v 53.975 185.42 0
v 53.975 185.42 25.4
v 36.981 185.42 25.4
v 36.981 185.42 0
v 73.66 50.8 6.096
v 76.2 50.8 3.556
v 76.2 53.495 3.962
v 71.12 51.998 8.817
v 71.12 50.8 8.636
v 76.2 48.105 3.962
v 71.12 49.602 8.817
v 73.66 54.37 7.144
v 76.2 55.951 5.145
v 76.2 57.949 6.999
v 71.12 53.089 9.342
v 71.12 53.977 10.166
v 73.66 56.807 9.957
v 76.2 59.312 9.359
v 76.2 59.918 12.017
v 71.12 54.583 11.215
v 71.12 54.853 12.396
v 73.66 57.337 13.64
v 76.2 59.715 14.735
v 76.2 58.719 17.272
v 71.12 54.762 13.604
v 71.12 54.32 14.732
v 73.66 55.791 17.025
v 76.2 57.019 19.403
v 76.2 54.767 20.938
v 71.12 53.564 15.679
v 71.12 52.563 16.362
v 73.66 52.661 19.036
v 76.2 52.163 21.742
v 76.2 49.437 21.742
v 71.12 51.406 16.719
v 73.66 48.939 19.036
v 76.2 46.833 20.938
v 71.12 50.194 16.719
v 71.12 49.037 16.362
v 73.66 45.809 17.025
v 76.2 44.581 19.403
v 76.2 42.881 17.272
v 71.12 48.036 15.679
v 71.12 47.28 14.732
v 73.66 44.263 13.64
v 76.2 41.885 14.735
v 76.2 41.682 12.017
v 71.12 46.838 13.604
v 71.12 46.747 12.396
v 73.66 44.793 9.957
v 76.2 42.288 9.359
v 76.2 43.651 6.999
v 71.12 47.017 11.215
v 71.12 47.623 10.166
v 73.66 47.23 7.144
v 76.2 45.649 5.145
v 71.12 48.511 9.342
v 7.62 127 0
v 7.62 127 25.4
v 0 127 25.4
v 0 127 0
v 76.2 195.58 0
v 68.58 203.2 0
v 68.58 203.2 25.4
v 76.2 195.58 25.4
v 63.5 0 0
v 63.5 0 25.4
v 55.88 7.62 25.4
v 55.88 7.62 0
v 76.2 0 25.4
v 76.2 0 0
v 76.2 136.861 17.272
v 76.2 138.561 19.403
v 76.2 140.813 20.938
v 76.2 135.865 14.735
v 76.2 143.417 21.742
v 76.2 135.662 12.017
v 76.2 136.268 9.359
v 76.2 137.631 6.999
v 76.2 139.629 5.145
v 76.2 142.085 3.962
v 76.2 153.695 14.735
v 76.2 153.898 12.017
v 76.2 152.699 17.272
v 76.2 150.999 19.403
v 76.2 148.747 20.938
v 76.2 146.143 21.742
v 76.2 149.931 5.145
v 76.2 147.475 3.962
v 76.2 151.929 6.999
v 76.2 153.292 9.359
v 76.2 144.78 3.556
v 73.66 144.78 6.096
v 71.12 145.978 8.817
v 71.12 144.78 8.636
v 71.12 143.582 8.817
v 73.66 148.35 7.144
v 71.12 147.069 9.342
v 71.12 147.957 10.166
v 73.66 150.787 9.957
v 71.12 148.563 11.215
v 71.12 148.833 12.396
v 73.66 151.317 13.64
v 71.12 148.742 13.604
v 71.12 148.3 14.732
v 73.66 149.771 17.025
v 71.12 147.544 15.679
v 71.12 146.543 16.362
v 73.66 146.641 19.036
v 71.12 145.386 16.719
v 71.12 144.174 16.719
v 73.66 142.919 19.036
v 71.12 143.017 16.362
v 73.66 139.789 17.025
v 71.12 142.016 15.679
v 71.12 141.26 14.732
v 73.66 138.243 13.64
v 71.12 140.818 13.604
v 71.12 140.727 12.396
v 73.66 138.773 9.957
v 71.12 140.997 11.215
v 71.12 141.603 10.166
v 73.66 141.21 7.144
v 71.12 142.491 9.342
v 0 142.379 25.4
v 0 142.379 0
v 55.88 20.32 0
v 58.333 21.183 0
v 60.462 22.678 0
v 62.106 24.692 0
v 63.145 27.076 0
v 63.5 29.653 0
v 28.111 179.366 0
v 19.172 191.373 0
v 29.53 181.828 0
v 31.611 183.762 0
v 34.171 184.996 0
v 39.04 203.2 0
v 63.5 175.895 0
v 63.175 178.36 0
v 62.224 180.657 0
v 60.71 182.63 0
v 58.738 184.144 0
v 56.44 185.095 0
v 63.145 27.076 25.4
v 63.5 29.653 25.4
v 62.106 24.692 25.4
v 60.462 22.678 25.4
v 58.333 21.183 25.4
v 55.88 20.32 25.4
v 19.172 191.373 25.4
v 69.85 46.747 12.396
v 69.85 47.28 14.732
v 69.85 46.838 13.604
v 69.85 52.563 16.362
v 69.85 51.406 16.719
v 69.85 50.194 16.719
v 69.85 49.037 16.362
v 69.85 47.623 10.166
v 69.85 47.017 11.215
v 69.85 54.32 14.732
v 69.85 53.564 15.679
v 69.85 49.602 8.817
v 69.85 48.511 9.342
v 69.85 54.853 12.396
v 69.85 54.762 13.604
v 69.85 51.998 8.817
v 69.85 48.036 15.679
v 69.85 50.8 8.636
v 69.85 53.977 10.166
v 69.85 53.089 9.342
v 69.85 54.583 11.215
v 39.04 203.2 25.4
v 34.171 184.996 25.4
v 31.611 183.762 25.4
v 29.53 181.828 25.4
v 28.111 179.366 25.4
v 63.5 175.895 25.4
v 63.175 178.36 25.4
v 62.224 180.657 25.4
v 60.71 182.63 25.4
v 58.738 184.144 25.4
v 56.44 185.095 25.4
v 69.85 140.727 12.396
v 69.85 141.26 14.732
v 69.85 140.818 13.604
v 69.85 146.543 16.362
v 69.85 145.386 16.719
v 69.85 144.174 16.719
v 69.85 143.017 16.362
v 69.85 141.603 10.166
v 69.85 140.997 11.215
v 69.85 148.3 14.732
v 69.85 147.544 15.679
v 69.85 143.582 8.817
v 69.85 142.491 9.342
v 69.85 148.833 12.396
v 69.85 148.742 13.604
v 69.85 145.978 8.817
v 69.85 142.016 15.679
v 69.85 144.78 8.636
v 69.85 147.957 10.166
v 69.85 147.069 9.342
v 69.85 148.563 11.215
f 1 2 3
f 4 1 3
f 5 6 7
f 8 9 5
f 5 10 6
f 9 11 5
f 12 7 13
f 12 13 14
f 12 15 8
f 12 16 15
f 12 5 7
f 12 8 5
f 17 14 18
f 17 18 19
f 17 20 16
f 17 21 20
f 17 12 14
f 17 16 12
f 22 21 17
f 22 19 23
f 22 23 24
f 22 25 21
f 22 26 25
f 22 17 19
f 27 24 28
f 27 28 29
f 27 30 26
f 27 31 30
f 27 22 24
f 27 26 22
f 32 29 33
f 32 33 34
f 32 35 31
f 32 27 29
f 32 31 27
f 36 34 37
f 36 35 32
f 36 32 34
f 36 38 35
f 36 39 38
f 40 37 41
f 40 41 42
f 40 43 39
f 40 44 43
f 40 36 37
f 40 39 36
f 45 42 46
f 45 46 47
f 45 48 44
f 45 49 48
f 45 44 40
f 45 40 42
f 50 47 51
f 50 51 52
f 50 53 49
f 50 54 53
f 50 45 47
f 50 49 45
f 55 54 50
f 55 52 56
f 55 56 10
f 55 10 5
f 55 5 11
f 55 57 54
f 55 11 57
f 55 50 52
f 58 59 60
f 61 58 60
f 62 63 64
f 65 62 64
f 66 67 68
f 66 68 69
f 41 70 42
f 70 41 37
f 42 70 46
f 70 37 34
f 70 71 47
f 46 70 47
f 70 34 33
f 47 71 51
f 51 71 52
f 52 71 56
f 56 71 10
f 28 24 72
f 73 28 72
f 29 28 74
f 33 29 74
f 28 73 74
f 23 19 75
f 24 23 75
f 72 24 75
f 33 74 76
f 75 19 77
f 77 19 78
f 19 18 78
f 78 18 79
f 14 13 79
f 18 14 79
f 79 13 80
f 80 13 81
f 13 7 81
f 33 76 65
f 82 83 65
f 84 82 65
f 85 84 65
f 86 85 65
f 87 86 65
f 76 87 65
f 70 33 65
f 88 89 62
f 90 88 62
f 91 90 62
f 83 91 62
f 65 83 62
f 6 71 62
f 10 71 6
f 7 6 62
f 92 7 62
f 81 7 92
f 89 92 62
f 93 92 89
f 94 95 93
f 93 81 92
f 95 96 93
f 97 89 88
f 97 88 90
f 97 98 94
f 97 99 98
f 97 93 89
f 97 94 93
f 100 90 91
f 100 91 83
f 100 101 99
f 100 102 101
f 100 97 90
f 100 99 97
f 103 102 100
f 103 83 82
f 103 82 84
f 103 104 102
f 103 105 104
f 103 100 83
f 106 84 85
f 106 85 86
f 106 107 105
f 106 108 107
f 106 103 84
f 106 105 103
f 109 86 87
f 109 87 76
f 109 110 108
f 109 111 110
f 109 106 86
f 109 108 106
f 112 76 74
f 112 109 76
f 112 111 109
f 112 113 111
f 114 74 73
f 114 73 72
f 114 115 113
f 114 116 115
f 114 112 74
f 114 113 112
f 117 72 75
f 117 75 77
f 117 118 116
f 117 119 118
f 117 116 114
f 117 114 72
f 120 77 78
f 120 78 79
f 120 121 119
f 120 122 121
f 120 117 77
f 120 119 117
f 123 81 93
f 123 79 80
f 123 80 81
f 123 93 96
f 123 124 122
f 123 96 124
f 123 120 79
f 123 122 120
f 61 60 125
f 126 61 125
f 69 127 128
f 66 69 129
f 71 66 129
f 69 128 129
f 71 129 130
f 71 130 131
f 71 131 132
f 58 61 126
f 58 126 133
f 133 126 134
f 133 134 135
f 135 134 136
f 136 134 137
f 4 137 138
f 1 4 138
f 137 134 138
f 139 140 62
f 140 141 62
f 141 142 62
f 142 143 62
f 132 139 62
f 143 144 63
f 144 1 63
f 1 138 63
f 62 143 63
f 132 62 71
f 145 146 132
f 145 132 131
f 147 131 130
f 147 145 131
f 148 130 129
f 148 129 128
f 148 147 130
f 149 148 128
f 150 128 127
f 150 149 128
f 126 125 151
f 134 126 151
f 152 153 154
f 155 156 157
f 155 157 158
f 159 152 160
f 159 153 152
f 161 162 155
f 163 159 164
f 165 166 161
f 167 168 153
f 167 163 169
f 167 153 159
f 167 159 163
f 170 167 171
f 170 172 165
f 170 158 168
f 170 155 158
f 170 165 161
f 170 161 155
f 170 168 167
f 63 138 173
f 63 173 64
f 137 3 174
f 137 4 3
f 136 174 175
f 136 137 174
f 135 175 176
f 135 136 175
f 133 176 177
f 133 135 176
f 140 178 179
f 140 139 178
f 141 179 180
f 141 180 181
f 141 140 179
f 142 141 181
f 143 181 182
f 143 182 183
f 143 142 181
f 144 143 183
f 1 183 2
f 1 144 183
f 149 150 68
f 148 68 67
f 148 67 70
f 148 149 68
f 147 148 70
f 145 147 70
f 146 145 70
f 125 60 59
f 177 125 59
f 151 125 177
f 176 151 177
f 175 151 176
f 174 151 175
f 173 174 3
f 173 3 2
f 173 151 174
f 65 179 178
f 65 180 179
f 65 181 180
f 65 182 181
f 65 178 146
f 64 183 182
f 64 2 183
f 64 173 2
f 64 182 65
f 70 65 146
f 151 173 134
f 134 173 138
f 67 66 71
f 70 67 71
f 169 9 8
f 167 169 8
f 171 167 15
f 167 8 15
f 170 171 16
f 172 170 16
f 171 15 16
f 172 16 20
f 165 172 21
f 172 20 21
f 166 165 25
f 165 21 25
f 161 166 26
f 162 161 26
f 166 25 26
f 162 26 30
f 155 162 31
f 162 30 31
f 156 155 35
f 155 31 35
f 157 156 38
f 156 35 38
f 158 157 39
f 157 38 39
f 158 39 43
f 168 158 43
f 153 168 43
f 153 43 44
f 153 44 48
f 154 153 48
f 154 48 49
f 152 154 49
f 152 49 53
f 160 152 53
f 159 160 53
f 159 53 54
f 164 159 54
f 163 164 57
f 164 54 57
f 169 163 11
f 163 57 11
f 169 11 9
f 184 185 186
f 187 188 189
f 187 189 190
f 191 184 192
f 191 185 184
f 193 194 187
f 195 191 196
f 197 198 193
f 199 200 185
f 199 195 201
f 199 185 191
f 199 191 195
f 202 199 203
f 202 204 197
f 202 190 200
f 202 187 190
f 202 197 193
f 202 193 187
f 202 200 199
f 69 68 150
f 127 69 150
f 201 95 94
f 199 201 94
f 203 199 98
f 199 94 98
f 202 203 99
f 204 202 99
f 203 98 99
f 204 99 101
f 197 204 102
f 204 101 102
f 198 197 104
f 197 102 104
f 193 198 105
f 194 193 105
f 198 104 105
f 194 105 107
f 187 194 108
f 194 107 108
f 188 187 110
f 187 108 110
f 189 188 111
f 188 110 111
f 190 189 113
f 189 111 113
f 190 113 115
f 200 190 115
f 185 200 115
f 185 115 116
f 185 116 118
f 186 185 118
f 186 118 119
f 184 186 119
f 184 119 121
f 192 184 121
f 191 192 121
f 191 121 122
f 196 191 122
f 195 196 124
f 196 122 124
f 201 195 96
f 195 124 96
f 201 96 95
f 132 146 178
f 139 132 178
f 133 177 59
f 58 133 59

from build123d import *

# Parameters (mm, degrees)
SKETCH1_W           = 76.2
SKETCH1_H           = 203.2
BOSS_EXTRUDE1_DEPTH = 25.4
CUT_EXTRUDE1_DEPTH  = 219.499061783
FILLET1_R           = 9.525
CHAMFER3_SIZE       = 7.62
CHAMFER5_SIZE       = 12.7
CHAMFER5_SIZE2      = 15.24
SKETCH5_R           = 4.064
CUT_EXTRUDE2_DEPTH  = 6.35
CHAMFER6_SIZE       = 5.08
FILLET2_R           = 9.525
CHAMFER7_SIZE       = 7.62


with BuildPart() as part:
    # Sketch1 → Boss-Extrude1 (new body)
    with BuildSketch(Plane.XY):
        with Locations((38.1, 101.6)):
            Rectangle(SKETCH1_W, SKETCH1_H)
    extrude(amount=BOSS_EXTRUDE1_DEPTH)

    # Sketch2 → Cut-Extrude1 (cut, through all)
    with BuildSketch(Plane.XY.offset(25.4)):
        Polygon((0, 0), (55.88, 0), (55.88, 20.32), (63.5, 20.32), (63.5, 185.42), (30.48, 185.42), (7.62, 127), (0, 127), align=None)
        Polygon((0, 142.378540166), (23.799701674, 203.2), (0, 203.2), align=None)
    extrude(amount=-CUT_EXTRUDE1_DEPTH, mode=Mode.SUBTRACT)

    # Fillet1
    fillet1_edges = [part.edges().sort_by_distance(p)[0] for p in [
        (30.48, 185.42, 12.7),
        (63.5, 185.42, 12.7),
    ]]
    fillet(fillet1_edges, radius=FILLET1_R)

    # Chamfer3
    chamfer3_edges = [part.edges().sort_by_distance(p)[0] for p in [
        (76.2, 203.2, 12.7),
    ]]
    chamfer(chamfer3_edges, length=CHAMFER3_SIZE)

    # Chamfer5
    chamfer5_edges = [part.edges().sort_by_distance(p)[0] for p in [
        (23.799701674, 203.2, 12.7),
    ]]
    chamfer5_side = [part.faces().sort_by_distance(p)[0] for p in [
        (11.899850837, 172.789270083, 12.7),
    ]]
    chamfer(chamfer5_edges, length=CHAMFER5_SIZE, length2=CHAMFER5_SIZE2, reference=chamfer5_side[0])

    # Sketch5 → Cut-Extrude2 (cut)
    with BuildSketch(Plane(origin=(76.2, 0, 0), x_dir=(0, 0, -1), z_dir=(1, 0, 0))):
        with Locations((-12.7, 144.78)):
            Circle(SKETCH5_R)
        with Locations((-12.7, 50.8)):
            Circle(SKETCH5_R)
    extrude(amount=-CUT_EXTRUDE2_DEPTH, mode=Mode.SUBTRACT)

    # Chamfer6
    chamfer6_edges = [part.edges().sort_by_distance(p)[0] for p in [
        (76.2, 144.78, 16.764),
        (76.2, 50.8, 16.764),
    ]]
    chamfer(chamfer6_edges, length=CHAMFER6_SIZE)

    # Fillet2
    # the kernel refuses this fillet: 9.525 mm, written as the material it adds along each edge
    with BuildSketch(Plane(origin=(63.5, 20.32, 25.4), x_dir=(-1, 0, 0), z_dir=(0, 0, -1))) as fillet2_piece_1:
        with BuildLine():
            CenterArc((9.525, 9.33255592), FILLET2_R, 180, 78.463040967)
            Line((0, 9.33255592), (-0.1905, 9.33255592))
            Line((-0.1905, 9.33255592), (-0.1905, 0))
            Line((-0.1905, 0), (0, -0.1905))
            ThreePointArc((0, -0.1905), (3.81, -0.1905), (7.5819, -0.186651118))
            Line((7.5819, -0.186651118), (7.62, 0))
        make_face()
    extrude(amount=25.4)

    # Chamfer7
    chamfer7_edges = [part.edges().sort_by_distance(p)[0] for p in [
        (55.88, 0, 12.7),
    ]]
    chamfer(chamfer7_edges, length=CHAMFER7_SIZE)


solid = part.part
